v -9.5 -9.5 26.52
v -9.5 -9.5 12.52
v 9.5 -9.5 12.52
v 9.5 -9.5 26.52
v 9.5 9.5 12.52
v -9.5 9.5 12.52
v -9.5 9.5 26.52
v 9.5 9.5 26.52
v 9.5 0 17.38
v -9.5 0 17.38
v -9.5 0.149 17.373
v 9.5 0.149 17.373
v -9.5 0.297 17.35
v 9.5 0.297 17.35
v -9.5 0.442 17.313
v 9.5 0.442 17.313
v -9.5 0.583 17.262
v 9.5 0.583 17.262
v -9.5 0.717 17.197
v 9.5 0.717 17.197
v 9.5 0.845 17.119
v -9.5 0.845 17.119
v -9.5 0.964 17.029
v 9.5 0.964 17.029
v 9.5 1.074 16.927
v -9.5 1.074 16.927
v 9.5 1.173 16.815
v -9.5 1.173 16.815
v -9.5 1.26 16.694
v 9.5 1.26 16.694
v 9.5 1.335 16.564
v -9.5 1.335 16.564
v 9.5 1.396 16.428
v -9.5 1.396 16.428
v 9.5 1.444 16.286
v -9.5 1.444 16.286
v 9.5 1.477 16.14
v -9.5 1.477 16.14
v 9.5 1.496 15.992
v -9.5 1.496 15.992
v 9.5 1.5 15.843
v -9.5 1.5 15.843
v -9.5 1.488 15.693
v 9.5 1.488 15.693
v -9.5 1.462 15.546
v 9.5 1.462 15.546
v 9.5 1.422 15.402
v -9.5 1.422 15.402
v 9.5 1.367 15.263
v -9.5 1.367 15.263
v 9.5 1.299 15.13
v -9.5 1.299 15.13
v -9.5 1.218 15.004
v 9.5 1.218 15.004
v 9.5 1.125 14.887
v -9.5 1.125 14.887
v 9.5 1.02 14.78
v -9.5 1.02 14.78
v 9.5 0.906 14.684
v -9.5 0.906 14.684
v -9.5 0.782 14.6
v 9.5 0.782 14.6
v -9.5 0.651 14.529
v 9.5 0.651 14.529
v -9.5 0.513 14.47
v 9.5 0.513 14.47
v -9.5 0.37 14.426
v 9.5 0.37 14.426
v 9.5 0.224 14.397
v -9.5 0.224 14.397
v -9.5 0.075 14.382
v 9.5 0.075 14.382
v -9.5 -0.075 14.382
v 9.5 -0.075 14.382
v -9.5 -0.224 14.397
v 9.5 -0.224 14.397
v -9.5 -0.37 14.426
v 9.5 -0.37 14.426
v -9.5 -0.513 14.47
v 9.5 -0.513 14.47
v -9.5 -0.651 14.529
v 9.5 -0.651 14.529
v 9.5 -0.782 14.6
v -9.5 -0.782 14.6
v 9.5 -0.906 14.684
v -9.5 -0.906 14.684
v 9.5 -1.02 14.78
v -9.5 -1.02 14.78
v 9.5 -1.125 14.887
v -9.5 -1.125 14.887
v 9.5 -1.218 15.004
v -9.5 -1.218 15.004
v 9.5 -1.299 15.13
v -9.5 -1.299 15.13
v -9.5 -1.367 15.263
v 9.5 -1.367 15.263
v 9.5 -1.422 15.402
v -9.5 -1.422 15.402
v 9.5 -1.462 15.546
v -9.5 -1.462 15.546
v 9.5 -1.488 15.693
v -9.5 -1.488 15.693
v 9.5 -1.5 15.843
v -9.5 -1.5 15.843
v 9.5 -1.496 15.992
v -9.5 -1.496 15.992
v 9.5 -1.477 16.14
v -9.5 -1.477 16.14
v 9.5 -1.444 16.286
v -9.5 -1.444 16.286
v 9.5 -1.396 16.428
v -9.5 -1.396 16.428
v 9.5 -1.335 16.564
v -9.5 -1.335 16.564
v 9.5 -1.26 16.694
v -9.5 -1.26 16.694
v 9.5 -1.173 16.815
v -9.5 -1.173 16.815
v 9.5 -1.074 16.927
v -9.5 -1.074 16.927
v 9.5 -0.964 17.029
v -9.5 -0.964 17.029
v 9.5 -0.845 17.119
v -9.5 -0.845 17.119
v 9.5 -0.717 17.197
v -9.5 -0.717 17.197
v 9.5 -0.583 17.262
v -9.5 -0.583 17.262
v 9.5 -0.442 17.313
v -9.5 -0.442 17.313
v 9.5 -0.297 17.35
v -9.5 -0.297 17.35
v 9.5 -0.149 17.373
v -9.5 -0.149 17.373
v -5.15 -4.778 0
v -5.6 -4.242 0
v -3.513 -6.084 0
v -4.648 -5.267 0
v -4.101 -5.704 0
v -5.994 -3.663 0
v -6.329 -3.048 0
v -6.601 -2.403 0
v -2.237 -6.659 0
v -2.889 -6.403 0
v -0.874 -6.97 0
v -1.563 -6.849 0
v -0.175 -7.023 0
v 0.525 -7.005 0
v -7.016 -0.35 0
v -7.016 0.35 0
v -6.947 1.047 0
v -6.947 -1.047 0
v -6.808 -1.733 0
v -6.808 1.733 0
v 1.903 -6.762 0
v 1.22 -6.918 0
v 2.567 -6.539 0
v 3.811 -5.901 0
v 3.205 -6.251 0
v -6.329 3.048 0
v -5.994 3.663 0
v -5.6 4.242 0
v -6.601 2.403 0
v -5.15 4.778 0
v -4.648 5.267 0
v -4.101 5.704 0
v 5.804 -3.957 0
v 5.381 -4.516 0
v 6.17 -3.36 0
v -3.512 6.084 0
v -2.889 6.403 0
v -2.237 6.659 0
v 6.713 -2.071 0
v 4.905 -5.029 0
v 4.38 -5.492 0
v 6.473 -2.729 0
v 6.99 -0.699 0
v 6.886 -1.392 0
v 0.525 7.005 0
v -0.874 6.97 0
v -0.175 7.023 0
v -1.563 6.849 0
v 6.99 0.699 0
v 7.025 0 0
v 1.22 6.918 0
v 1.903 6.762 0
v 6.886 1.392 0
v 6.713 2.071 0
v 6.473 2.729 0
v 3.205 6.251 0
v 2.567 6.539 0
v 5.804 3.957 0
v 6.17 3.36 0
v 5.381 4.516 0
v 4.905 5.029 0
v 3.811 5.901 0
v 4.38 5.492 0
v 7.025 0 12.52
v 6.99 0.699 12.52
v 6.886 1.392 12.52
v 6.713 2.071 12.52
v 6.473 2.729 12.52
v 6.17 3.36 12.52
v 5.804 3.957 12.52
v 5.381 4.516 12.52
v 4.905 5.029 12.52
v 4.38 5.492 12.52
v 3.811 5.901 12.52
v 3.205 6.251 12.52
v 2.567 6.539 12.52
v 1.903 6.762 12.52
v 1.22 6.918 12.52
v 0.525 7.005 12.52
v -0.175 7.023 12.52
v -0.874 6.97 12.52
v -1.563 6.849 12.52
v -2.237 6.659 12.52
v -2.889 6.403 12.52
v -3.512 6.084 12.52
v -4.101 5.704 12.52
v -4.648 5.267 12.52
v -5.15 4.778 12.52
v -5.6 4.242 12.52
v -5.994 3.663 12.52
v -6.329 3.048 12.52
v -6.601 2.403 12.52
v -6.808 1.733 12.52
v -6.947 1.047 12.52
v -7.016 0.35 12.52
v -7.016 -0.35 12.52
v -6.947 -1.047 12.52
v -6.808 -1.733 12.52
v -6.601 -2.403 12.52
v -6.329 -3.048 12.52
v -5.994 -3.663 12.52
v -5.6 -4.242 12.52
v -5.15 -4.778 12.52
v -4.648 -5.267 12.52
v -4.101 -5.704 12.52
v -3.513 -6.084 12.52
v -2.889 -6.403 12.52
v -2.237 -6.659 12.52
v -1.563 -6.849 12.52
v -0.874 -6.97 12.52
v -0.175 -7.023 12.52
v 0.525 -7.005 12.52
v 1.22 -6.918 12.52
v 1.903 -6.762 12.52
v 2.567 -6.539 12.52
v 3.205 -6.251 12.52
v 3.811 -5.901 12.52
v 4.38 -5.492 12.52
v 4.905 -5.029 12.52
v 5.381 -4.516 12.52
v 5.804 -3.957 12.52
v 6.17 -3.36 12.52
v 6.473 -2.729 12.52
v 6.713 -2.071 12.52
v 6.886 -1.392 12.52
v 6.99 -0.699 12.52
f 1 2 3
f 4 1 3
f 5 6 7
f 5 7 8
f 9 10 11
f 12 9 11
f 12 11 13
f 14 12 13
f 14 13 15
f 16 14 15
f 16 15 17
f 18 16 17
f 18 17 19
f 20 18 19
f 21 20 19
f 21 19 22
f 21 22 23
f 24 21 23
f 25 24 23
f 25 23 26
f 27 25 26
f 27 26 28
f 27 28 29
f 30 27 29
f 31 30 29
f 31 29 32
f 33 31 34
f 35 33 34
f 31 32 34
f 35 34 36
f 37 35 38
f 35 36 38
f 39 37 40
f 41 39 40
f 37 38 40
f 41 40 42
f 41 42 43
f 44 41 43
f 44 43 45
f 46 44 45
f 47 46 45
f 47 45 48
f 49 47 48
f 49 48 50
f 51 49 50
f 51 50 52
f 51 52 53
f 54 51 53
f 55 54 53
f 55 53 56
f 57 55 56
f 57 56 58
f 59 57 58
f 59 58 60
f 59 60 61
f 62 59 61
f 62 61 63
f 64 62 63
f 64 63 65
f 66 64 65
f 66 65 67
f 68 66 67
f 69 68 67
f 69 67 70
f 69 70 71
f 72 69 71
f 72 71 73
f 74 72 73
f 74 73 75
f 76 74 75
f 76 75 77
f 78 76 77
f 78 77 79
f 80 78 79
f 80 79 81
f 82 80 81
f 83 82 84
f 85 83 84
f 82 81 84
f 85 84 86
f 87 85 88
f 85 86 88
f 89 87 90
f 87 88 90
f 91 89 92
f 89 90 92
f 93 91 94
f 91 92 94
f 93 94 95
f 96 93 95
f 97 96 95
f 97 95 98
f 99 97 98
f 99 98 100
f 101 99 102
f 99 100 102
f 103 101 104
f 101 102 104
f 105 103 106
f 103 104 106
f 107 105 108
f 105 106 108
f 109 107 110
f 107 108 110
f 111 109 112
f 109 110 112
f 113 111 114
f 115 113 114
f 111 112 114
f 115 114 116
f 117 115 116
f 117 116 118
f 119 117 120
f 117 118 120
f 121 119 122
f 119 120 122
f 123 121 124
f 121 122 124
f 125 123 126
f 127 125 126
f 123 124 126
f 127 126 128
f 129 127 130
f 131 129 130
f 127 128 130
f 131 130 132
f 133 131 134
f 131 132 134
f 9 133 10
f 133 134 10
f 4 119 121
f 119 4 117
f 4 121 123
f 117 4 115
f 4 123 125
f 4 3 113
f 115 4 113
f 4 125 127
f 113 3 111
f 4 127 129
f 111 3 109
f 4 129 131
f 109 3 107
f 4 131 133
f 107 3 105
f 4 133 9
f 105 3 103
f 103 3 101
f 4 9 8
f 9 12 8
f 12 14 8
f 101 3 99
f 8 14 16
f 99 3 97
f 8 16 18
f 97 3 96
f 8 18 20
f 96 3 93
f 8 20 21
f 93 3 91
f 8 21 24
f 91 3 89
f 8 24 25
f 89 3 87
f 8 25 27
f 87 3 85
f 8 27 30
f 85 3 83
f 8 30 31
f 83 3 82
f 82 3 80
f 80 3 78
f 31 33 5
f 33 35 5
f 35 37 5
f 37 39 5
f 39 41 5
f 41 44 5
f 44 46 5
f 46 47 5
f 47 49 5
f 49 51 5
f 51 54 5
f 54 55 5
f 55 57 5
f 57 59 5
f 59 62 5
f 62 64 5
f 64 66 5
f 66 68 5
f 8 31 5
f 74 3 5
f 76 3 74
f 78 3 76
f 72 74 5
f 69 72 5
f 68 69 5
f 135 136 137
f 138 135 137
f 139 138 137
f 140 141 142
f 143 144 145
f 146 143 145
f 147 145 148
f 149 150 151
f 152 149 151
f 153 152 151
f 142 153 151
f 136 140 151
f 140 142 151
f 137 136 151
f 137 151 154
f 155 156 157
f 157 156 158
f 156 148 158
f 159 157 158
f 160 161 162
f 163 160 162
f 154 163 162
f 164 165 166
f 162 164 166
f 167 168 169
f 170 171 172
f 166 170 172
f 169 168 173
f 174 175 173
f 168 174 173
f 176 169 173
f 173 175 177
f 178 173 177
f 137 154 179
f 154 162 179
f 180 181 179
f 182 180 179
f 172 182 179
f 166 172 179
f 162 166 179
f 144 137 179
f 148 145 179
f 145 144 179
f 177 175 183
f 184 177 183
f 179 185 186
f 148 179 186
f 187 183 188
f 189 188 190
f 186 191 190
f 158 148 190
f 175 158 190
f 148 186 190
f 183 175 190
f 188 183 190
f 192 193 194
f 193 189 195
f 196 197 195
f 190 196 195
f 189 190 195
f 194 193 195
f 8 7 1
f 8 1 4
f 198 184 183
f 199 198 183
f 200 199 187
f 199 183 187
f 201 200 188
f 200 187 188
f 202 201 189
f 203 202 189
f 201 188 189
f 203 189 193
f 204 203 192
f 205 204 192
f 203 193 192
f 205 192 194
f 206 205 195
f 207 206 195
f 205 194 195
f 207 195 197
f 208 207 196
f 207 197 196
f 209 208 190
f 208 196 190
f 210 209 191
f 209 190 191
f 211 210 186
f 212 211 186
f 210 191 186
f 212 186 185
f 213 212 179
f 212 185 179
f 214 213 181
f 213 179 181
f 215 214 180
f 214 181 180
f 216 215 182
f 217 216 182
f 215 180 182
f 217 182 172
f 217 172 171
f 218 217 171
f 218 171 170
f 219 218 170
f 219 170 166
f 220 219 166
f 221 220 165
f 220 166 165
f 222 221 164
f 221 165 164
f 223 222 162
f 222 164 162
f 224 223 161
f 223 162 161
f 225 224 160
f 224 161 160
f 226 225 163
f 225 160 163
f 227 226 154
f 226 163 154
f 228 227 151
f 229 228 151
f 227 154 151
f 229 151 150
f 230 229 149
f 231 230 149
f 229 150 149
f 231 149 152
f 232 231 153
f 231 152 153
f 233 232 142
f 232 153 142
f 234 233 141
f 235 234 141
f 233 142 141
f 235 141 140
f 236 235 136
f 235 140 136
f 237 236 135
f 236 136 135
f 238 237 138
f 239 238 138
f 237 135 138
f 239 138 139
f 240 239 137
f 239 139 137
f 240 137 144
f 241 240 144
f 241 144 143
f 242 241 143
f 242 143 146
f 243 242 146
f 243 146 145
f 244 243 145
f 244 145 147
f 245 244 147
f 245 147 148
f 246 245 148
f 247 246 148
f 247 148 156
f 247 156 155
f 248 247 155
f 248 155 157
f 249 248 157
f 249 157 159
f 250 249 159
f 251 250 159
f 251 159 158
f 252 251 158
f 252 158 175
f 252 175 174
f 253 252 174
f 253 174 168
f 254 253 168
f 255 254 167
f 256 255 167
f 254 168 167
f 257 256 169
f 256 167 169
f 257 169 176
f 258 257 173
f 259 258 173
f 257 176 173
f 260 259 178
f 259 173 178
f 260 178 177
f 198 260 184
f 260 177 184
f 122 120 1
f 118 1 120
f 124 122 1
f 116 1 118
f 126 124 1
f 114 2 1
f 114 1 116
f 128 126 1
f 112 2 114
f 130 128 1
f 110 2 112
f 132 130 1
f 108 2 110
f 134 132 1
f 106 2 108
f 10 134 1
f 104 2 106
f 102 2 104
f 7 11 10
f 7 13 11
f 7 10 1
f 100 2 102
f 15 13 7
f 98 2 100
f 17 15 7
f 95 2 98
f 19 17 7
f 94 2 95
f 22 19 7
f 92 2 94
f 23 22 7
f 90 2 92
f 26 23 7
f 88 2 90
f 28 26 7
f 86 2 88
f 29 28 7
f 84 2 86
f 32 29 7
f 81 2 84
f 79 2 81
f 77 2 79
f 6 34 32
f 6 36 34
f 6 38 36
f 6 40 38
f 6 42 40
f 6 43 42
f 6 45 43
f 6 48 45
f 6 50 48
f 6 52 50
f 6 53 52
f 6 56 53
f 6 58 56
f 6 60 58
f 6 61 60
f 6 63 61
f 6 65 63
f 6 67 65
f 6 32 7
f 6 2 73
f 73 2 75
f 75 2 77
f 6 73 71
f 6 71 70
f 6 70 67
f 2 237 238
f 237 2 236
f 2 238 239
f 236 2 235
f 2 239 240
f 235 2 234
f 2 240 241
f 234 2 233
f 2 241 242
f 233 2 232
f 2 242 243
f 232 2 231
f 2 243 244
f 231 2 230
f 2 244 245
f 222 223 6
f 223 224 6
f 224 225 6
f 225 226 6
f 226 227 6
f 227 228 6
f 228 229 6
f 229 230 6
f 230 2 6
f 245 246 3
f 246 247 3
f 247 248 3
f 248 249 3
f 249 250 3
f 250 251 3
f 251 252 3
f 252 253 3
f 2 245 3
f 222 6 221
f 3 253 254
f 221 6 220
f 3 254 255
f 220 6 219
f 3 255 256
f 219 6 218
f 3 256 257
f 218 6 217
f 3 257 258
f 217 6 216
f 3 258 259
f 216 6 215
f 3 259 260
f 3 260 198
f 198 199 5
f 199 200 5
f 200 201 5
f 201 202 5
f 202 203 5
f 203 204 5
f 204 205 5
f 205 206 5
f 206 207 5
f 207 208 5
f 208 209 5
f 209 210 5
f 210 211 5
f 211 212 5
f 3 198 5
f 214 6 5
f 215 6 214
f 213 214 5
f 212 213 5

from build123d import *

# Parameters (mm, degrees)
SKETCH_1_R          = 7.025
EXTRUDE_1_DEPTH     = 12.52
SKETCH_2_W          = 19
SKETCH_2_H          = 19
EXTRUDE_2_DEPTH     = 14
SKETCH_3_R          = 1.5
CUT_EXTRUDE_1_DEPTH = 34.978822817


with BuildPart() as part:
    # 草图1 → 凸台-拉伸1 (new body)
    with BuildSketch(Plane.XY):
        Circle(SKETCH_1_R)
    extrude(amount=EXTRUDE_1_DEPTH)

    # 草图2 → 凸台-拉伸2 (add)
    with BuildSketch(Plane.XY.offset(12.52)):
        Rectangle(SKETCH_2_W, SKETCH_2_H)
    extrude(amount=EXTRUDE_2_DEPTH)

    # 草图3 → 切除-拉伸1 (cut, through all)
    with BuildSketch(Plane.ZY.offset(9.5)):
        with Locations((15.88, 0)):
            Circle(SKETCH_3_R)
    extrude(amount=-CUT_EXTRUDE_1_DEPTH, mode=Mode.SUBTRACT)


solid = part.part
